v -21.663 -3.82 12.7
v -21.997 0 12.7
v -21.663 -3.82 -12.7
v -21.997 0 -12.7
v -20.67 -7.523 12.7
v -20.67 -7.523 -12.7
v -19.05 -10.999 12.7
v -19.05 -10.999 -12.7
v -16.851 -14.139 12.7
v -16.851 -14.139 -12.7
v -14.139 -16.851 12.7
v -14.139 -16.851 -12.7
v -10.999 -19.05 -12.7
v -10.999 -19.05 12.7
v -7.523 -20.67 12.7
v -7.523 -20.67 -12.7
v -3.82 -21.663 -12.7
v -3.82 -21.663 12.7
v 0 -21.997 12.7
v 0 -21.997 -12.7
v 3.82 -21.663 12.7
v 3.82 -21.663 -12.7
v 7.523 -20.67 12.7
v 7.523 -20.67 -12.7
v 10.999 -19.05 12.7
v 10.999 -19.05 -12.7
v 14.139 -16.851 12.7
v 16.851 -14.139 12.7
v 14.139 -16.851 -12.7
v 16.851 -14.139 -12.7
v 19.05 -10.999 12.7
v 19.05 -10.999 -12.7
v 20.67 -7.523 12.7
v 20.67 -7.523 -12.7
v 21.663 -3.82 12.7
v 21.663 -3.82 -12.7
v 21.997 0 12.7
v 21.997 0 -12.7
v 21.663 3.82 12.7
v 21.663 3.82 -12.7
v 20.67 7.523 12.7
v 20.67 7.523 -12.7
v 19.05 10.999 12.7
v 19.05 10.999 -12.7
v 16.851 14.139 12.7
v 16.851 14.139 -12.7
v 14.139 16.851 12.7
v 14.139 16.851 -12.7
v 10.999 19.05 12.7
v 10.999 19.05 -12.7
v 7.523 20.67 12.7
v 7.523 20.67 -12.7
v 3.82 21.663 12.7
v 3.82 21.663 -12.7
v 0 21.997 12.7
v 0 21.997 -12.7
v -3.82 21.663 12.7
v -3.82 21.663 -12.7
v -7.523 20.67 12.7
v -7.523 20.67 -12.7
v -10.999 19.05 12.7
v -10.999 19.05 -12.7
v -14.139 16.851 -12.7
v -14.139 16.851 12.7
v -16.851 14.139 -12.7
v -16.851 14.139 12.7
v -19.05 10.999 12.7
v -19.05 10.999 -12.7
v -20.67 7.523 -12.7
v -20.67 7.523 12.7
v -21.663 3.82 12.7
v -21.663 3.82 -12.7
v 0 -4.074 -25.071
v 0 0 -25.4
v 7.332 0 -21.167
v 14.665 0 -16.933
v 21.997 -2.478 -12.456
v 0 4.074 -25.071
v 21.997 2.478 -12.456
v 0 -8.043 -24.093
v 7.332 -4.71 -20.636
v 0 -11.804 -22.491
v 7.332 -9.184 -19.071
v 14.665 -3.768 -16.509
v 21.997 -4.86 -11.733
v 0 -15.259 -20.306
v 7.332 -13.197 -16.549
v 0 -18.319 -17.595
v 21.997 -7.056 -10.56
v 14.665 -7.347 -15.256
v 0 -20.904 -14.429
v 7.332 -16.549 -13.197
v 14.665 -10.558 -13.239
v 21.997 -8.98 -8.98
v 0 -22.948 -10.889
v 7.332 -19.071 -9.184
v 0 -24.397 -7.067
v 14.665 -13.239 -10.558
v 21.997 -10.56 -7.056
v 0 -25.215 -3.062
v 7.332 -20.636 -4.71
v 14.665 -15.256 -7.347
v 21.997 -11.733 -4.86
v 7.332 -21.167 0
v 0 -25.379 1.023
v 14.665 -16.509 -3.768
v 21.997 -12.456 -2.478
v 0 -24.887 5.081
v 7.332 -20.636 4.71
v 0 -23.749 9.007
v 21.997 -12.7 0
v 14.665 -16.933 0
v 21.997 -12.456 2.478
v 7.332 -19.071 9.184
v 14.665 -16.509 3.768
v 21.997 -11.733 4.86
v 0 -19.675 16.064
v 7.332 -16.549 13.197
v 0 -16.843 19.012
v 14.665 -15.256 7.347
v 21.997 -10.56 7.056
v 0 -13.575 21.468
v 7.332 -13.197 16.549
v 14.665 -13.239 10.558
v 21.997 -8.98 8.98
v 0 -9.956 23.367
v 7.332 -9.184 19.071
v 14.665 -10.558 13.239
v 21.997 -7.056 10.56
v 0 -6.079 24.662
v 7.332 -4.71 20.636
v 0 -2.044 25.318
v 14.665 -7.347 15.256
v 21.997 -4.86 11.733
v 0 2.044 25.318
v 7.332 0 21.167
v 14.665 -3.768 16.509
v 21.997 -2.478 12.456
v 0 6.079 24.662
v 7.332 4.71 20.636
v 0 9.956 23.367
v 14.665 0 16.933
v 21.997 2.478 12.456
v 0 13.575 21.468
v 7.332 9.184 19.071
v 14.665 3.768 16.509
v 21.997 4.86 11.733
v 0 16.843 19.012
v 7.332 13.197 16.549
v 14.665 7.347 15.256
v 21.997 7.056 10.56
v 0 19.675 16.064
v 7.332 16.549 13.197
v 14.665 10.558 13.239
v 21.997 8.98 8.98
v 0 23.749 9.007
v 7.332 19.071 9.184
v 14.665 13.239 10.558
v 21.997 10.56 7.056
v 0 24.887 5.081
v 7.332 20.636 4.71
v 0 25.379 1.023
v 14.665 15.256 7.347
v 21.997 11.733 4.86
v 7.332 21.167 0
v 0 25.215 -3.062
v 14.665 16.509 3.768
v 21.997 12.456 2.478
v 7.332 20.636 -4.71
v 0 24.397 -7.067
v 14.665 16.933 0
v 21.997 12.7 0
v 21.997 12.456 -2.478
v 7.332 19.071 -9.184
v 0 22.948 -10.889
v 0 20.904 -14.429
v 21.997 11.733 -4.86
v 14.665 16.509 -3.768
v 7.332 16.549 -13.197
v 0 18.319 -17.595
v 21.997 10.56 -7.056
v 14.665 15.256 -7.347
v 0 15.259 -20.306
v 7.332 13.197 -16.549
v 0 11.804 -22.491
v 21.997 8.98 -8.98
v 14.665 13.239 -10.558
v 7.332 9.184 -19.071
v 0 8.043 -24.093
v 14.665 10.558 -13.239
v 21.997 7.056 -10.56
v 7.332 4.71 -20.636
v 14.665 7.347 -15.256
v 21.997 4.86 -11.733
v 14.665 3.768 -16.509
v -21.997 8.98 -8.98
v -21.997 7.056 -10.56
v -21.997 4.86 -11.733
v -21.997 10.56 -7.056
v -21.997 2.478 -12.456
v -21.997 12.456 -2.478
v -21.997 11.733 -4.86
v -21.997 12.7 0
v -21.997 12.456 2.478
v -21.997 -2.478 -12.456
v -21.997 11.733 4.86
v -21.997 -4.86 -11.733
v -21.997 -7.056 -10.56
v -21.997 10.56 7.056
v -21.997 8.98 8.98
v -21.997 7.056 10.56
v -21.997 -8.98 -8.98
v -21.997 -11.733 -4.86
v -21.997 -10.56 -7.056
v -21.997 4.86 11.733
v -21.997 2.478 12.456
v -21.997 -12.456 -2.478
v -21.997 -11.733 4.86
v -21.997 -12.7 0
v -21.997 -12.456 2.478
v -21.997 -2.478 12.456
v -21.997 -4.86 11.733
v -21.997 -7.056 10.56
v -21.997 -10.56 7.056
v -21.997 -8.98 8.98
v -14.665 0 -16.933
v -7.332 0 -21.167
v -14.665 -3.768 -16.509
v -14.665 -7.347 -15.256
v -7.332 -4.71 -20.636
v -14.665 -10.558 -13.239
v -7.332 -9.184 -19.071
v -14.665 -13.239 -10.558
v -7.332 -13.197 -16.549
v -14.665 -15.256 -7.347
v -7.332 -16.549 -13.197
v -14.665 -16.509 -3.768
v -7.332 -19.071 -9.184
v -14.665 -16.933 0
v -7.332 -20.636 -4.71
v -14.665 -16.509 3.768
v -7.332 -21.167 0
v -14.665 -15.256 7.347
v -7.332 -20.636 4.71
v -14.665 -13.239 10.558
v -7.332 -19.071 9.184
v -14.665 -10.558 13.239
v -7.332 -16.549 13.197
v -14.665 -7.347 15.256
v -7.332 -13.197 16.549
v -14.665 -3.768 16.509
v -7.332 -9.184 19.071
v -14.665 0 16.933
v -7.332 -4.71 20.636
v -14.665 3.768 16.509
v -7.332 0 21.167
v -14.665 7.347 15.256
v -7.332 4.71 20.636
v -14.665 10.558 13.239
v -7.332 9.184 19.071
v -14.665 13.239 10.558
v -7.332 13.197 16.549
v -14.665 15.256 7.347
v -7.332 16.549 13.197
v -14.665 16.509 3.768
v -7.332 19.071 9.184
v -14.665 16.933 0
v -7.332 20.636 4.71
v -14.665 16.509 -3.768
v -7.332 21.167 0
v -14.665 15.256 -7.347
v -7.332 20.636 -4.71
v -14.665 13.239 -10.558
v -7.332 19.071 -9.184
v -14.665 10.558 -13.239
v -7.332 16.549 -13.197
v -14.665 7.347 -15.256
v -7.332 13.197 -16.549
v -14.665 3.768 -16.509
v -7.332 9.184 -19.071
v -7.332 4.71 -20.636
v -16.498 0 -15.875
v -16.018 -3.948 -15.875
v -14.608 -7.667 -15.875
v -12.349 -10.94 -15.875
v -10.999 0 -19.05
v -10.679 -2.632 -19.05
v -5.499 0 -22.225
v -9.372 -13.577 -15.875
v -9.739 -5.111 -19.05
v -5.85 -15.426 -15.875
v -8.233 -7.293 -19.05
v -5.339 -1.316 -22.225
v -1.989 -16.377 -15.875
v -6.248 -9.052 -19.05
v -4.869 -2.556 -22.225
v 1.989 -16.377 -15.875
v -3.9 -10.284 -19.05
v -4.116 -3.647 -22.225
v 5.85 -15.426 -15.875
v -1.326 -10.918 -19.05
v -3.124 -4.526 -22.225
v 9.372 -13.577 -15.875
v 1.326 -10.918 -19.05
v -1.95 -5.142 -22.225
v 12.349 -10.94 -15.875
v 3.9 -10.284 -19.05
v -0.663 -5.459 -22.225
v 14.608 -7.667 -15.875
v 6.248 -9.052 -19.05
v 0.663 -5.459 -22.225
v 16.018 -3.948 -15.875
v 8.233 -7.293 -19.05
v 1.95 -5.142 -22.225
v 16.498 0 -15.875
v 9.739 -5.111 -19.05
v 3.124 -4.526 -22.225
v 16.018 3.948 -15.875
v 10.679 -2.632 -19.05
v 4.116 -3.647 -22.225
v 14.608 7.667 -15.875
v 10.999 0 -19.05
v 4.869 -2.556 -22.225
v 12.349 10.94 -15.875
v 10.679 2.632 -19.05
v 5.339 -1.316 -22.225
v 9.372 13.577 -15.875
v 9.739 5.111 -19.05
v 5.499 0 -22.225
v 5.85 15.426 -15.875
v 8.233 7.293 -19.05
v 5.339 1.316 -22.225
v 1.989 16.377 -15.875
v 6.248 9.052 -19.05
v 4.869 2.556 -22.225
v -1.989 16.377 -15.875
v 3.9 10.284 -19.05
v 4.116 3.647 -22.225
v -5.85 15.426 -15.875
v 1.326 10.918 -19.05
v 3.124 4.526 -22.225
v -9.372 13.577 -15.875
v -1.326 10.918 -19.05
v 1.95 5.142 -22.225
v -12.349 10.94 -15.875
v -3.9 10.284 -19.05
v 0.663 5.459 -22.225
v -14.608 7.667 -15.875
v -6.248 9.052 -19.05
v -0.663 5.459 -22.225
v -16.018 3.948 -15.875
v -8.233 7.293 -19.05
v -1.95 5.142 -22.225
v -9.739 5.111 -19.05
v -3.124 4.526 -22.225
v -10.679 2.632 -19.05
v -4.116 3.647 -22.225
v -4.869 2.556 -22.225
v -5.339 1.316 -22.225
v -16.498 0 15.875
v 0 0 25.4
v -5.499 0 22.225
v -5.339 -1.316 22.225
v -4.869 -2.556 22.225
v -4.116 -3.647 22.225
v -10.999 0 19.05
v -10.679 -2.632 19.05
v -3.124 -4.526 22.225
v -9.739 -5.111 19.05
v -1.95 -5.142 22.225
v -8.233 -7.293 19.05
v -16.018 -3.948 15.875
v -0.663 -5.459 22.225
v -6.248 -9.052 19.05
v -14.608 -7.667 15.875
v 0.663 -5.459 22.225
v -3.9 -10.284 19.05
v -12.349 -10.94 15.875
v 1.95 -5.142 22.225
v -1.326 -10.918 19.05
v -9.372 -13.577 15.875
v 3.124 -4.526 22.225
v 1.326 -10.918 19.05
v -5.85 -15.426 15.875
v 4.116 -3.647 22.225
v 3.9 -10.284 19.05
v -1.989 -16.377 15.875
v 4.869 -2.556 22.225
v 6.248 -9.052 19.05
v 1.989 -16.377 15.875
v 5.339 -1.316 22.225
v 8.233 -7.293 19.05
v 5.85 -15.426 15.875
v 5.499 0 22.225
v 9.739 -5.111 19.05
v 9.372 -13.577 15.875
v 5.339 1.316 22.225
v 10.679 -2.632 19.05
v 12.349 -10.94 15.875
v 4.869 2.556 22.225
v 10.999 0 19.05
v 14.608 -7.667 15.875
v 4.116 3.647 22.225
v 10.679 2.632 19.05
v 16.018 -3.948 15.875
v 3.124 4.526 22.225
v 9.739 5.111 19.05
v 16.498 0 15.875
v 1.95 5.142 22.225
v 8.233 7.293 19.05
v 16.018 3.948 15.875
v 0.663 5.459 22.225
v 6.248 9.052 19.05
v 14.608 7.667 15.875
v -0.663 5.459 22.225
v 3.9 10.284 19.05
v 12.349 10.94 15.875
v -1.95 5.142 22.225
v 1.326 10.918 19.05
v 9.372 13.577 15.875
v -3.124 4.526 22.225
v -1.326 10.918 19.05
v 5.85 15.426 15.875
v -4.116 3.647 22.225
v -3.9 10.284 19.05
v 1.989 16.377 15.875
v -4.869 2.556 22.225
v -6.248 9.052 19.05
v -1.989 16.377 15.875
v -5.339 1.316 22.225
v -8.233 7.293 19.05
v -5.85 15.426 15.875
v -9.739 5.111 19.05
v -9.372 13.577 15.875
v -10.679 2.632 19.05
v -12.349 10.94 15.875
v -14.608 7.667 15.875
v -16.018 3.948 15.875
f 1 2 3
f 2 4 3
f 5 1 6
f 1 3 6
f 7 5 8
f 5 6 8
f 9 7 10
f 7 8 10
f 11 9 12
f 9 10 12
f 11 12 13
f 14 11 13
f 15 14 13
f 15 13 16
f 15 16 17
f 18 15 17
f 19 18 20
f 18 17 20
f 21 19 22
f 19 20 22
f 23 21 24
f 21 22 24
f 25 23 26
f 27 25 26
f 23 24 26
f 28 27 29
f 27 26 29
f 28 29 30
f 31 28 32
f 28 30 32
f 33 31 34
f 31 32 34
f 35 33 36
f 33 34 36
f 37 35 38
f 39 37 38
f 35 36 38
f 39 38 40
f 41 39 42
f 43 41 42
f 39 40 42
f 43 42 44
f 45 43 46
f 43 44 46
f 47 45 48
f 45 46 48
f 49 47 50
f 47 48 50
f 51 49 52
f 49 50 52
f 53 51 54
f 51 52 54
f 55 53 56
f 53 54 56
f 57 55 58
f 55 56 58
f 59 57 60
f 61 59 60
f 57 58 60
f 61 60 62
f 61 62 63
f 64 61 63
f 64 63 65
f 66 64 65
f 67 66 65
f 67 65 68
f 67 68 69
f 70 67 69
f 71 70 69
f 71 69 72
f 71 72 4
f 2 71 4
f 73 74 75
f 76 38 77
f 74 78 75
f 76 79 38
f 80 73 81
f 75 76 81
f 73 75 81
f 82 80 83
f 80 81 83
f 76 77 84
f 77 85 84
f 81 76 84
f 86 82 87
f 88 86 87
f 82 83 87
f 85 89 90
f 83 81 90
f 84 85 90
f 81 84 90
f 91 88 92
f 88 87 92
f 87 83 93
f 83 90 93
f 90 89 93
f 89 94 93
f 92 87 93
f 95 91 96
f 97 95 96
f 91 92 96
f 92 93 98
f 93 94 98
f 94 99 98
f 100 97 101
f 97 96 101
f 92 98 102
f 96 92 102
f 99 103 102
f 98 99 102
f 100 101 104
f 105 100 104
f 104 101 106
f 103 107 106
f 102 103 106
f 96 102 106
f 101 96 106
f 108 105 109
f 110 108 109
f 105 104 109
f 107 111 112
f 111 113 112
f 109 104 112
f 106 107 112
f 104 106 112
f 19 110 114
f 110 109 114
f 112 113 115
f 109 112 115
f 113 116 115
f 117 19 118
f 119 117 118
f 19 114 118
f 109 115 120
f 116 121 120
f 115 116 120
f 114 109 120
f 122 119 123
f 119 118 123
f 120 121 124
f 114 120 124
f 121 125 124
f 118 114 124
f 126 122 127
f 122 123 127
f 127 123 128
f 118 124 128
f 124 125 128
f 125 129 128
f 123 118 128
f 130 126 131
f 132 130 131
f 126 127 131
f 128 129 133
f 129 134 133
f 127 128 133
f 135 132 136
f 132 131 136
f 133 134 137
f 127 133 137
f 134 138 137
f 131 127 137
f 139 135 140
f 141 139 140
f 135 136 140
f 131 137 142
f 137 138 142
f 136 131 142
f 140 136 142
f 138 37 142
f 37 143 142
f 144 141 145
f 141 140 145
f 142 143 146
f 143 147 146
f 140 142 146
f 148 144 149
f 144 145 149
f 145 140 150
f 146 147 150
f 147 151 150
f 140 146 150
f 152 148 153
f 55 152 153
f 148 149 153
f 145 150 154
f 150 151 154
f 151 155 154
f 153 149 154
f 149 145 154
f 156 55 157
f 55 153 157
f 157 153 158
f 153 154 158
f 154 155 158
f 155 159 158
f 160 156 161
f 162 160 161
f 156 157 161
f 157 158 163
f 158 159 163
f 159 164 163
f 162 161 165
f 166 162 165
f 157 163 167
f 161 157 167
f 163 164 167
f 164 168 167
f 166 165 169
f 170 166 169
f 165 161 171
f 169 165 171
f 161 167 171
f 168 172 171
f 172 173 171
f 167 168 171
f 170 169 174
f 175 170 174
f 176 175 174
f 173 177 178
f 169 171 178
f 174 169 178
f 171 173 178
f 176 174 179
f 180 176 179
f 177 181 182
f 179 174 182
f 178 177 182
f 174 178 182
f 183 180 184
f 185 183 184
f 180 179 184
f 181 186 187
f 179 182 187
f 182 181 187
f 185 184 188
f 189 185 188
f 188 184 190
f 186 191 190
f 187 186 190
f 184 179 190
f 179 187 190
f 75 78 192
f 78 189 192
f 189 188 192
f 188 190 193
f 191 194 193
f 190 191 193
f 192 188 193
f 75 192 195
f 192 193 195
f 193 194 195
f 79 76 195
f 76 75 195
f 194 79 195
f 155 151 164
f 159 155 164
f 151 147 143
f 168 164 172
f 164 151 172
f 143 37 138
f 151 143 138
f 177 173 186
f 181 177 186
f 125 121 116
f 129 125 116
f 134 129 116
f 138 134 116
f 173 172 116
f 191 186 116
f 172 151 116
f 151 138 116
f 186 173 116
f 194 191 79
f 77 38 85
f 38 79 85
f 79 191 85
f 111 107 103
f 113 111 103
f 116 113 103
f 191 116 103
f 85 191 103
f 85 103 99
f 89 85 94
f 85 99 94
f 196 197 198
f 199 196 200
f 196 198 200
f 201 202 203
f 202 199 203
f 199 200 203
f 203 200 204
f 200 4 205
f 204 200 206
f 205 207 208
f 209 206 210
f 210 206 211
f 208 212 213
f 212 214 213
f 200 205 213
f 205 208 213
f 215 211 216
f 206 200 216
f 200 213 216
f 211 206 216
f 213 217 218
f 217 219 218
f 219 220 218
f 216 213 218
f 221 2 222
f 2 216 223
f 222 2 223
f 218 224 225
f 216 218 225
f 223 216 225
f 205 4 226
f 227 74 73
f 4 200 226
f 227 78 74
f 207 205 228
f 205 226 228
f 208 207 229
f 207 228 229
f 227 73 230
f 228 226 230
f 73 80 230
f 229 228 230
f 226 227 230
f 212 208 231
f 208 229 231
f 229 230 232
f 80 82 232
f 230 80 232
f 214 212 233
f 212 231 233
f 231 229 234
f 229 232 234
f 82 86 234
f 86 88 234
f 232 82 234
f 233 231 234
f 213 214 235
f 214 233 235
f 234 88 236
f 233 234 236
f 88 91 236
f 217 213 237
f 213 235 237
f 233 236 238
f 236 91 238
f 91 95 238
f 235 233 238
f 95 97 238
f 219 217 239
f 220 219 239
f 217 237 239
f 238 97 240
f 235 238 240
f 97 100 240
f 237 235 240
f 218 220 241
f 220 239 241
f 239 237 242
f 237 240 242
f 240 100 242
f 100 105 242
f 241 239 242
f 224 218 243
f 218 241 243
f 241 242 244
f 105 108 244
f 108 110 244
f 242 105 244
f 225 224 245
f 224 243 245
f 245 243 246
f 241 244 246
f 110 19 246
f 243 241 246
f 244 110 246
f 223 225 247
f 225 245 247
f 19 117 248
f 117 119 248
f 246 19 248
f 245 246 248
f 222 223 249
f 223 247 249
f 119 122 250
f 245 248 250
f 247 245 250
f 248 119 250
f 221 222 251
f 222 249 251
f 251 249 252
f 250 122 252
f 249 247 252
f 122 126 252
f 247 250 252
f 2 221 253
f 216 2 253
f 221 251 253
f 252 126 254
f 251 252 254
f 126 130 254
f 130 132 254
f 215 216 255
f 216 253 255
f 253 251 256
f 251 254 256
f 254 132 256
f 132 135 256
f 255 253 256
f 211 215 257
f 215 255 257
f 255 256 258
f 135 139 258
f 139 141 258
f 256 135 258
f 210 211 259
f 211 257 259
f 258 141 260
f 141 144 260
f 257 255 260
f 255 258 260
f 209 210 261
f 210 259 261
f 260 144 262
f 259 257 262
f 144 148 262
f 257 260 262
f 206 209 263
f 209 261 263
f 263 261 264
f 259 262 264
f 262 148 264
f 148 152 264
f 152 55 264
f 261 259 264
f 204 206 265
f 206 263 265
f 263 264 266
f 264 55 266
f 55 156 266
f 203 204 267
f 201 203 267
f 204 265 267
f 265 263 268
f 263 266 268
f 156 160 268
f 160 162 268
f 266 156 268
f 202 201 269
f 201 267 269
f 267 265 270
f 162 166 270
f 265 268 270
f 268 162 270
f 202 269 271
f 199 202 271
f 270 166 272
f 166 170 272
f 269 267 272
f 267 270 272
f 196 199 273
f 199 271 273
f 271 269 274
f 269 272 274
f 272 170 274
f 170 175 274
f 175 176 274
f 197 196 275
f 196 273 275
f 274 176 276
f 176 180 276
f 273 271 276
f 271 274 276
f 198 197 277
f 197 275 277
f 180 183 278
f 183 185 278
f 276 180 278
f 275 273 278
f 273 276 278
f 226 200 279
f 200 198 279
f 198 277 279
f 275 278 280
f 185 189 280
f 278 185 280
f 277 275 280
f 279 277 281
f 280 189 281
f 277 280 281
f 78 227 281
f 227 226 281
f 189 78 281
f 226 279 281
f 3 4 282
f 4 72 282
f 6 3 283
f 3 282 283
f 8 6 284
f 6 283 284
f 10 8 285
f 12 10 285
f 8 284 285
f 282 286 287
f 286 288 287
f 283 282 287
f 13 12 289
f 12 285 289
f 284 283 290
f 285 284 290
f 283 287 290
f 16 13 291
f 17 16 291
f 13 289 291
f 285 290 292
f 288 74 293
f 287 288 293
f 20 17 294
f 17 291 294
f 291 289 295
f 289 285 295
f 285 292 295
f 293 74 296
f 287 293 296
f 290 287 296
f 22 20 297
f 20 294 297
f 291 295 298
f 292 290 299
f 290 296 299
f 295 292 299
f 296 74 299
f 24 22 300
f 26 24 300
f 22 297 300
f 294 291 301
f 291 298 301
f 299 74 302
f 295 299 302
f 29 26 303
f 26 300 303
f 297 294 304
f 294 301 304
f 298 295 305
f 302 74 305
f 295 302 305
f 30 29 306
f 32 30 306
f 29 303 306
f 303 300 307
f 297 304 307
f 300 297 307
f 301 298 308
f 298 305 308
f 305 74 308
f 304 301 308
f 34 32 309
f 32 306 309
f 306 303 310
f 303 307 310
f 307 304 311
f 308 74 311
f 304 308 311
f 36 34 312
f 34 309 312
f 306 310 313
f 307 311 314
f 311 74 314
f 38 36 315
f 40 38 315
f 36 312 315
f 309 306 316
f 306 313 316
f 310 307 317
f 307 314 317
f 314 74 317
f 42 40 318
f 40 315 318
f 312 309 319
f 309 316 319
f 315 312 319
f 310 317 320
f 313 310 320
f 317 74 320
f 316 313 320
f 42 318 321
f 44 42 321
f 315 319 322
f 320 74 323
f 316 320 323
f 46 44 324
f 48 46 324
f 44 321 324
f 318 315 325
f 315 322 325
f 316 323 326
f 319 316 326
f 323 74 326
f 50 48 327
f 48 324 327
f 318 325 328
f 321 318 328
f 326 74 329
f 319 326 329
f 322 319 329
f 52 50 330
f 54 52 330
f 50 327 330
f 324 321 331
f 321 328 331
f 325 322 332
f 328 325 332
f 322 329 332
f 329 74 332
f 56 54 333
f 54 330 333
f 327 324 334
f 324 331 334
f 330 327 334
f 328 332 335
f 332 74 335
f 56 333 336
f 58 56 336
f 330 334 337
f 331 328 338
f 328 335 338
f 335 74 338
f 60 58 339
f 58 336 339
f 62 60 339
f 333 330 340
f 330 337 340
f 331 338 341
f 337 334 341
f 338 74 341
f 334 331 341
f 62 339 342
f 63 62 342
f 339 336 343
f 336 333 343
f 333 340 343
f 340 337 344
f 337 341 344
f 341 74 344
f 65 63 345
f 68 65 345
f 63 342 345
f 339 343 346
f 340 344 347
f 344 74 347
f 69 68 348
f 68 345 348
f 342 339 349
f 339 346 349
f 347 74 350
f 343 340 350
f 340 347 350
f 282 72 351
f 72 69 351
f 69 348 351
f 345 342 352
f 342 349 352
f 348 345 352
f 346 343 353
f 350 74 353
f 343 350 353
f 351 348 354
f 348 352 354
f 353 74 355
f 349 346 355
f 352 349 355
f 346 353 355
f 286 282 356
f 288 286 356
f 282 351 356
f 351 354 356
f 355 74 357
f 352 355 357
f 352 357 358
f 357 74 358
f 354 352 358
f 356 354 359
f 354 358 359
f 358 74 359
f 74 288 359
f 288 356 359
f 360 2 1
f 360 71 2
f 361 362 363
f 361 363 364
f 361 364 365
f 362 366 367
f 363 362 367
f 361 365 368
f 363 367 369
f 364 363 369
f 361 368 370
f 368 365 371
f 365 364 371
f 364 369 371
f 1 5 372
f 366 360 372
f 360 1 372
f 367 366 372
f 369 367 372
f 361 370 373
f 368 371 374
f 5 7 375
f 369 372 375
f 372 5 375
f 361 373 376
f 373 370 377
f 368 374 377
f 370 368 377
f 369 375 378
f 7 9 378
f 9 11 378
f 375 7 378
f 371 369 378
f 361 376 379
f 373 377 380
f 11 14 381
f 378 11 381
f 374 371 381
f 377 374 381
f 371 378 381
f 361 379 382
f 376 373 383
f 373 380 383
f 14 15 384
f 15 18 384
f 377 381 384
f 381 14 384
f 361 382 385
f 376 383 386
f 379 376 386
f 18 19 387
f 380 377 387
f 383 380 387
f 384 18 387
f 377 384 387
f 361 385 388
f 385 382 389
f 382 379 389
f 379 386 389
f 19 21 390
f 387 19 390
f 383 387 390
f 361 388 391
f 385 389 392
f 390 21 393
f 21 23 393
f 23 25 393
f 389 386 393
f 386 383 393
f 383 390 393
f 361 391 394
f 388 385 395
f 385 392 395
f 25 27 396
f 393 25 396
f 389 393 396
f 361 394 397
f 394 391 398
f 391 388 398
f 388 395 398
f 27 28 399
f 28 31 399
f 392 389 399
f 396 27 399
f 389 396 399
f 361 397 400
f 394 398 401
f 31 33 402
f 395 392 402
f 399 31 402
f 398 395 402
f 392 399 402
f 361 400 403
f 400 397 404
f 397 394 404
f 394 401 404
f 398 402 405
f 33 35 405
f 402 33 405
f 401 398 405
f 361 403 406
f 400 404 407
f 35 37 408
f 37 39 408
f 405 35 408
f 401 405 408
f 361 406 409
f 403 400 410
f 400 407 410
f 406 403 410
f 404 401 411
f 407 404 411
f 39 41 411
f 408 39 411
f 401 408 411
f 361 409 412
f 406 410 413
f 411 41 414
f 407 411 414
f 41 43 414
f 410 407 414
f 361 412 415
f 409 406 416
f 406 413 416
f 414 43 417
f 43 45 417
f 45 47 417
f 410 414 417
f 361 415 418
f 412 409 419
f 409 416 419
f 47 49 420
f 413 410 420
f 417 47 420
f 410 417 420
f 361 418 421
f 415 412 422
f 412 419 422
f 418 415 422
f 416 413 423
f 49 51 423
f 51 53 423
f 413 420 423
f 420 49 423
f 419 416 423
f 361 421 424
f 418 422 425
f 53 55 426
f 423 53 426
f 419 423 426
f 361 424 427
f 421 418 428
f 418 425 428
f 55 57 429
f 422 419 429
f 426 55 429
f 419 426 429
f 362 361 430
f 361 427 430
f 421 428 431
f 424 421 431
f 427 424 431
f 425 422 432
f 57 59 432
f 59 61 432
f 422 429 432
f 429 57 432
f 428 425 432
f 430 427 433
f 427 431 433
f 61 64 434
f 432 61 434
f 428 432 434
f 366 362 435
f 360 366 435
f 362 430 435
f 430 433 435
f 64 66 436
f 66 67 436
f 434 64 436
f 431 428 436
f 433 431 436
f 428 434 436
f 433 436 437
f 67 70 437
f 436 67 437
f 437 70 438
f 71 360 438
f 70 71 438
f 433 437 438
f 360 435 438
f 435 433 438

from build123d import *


with BuildPart() as f1:
    # F0 (on Front) → F1 (revolve)
    with BuildSketch(Plane.XZ):
        Polygon((0, 0), (0, 25.4), (-21.997045, 12.7), align=None)
        Polygon((-21.997045, 0), (0, 0), (-21.997045, 12.7), align=None)
        Polygon((0, -25.4), (0, 0), (-21.997045, -12.7), align=None)
        Polygon((-21.997045, -12.7), (0, 0), (-21.997045, 0), align=None)
    revolve(axis=Axis((0, 0, 12.7), (0, 0, 1)))


with BuildPart() as f2:
    # F0 (on Front) → F2 (revolve)
    with BuildSketch(Plane.XZ):
        Polygon((0, -25.4), (0, 0), (-21.997045, -12.7), align=None)
        Polygon((-21.997045, -12.7), (0, 0), (-21.997045, 0), align=None)
        Polygon((0, -25.4), (21.997045, -12.7), (0, 0), align=None)
        Polygon((0, 0), (21.997045, -12.7), (21.997045, 0), align=None)
    revolve(axis=Axis((-10.998523, 0, 0), (-1, 0, 0)))


solid = Compound([f1.part, f2.part])
